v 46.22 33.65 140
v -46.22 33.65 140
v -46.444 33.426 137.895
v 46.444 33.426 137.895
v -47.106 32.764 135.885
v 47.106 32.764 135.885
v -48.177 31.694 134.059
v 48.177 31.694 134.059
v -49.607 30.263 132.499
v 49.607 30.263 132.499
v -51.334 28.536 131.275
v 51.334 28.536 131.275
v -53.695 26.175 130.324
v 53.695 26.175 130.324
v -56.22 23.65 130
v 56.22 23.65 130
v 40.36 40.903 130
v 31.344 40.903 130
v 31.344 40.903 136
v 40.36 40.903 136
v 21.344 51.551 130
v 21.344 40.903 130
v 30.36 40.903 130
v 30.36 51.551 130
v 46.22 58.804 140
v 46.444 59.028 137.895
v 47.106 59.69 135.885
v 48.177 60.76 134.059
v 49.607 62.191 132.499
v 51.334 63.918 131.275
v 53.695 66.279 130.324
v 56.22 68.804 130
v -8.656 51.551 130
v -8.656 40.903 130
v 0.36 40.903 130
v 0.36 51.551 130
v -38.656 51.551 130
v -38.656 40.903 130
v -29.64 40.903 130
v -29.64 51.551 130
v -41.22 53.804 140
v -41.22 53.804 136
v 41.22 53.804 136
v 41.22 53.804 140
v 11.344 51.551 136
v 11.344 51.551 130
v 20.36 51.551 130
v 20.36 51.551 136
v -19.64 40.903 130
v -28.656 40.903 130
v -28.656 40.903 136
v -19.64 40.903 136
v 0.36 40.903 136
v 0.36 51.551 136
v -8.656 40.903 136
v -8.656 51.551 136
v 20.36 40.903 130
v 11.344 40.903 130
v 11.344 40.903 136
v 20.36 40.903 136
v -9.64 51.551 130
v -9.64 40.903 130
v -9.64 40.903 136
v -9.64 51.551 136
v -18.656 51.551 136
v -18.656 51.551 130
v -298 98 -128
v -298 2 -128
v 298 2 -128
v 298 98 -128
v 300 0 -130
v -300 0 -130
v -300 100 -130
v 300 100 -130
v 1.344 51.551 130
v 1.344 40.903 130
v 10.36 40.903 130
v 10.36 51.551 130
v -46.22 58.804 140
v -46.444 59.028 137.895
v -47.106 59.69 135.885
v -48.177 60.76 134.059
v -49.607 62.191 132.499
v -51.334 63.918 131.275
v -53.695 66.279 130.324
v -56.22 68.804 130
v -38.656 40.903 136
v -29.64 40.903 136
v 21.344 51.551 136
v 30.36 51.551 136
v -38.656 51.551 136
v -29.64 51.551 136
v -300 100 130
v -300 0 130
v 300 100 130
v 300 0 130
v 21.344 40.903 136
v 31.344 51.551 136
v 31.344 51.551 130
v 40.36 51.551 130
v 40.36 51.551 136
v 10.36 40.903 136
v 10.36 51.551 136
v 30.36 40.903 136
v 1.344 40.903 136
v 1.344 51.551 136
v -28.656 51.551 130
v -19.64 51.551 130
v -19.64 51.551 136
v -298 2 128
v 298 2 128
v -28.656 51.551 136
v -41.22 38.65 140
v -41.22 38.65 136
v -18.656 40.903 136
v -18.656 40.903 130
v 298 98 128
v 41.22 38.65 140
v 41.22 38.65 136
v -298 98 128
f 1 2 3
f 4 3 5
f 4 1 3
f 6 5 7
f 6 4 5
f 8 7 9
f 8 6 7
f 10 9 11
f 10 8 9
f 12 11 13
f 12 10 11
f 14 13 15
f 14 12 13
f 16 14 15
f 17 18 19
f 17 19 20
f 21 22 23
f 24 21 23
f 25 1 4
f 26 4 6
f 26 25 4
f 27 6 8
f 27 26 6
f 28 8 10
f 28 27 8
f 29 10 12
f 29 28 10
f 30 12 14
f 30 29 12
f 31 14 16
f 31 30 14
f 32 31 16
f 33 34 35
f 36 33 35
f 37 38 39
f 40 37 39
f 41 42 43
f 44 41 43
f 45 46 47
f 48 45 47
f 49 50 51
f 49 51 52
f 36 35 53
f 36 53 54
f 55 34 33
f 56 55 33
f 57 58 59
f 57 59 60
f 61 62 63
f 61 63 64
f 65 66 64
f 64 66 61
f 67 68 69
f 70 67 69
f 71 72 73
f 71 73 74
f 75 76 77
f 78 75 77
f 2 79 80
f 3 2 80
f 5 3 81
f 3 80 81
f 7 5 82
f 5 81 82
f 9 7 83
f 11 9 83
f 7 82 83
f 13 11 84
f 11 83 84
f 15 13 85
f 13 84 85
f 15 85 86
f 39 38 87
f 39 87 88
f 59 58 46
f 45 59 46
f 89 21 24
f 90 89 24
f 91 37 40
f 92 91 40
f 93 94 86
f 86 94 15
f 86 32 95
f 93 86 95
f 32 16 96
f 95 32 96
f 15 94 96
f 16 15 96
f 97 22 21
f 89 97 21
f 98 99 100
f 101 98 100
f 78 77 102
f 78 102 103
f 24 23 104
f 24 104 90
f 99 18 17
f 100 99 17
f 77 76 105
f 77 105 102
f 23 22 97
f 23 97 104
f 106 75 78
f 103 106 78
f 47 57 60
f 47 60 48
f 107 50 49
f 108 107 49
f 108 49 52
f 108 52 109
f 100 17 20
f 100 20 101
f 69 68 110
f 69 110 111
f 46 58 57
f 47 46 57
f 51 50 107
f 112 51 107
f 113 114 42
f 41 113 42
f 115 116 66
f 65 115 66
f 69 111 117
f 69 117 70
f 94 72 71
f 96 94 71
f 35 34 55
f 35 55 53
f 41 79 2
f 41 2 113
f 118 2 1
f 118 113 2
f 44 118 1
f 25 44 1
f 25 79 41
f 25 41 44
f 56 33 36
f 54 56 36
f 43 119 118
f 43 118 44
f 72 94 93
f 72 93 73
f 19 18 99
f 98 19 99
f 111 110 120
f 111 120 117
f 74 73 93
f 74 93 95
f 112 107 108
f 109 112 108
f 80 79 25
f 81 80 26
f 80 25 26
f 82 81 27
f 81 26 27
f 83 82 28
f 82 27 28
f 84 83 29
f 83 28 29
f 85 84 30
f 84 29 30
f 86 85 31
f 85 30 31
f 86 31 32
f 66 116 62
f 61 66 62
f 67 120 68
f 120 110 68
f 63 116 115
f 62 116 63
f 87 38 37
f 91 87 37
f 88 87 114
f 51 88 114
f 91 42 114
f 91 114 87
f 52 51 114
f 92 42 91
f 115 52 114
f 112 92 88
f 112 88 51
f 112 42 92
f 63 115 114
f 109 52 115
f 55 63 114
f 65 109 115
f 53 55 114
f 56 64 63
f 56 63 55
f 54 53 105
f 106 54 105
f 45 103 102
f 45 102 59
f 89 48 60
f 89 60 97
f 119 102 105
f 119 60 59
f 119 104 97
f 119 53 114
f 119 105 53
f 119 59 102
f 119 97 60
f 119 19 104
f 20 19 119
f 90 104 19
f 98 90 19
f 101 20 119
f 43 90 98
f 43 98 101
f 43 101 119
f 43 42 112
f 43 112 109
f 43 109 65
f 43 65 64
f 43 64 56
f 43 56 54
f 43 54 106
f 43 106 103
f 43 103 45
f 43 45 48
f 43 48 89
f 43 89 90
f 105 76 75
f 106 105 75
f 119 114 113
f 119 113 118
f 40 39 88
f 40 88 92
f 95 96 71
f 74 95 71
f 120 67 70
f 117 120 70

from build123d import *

# Parameters (mm, degrees)
SKETCH1_W           = 600
SKETCH1_H           = 260
BOSS_EXTRUDE1_DEPTH = 100
SHELL1_T            = 2
SKETCH2_W           = 92.440689116
SKETCH2_H           = 25.153929011
SKETCH2_W_2         = 82.440689116
SKETCH2_H_2         = 15.153929011
BOSS_EXTRUDE2_DEPTH = 10
SKETCH2_3_W         = 82.440689116
SKETCH2_3_H         = 15.153929011
SKETCH2_3_W_2       = 9.01524931
SKETCH2_3_H_2       = 10.647439476
BOSS_EXTRUDE3_DEPTH = 6
FILLET1_R           = 10


with BuildPart() as part:
    # Sketch1 → Boss-Extrude1 (new body)
    with BuildSketch(Plane(origin=(0, 0, 0), x_dir=(1, 0, 0), z_dir=(0, 1, 0))):
        Rectangle(SKETCH1_W, SKETCH1_H)
    extrude(amount=BOSS_EXTRUDE1_DEPTH)

    # Shell1 (no face opened: a closed hollow body)
    add(offset(amount=-SHELL1_T, mode=Mode.PRIVATE), mode=Mode.SUBTRACT)

    # Sketch2 → Boss-Extrude2 (add)
    with BuildSketch(Plane.XY.offset(130)):
        with Locations((0, 46.226910649)):
            Rectangle(SKETCH2_W, SKETCH2_H)
        with Locations((0, 46.226910649)):
            Rectangle(SKETCH2_W_2, SKETCH2_H_2, mode=Mode.SUBTRACT)
    extrude(amount=BOSS_EXTRUDE2_DEPTH)

    # Sketch2<3> → Boss-Extrude3 (add)
    with BuildSketch(Plane.XY.offset(130)):
        with Locations((0, 46.226910649)):
            Rectangle(SKETCH2_3_W, SKETCH2_3_H)
        with Locations((35.85201026, 46.226910648)):
            Rectangle(SKETCH2_3_W_2, SKETCH2_3_H_2, mode=Mode.SUBTRACT)
        with Locations((25.85201026, 46.226910648)):
            Rectangle(SKETCH2_3_W_2, SKETCH2_3_H_2, mode=Mode.SUBTRACT)
        with Locations((15.85201026, 46.226910648)):
            Rectangle(SKETCH2_3_W_2, SKETCH2_3_H_2, mode=Mode.SUBTRACT)
        with Locations((5.85201026, 46.226910648)):
            Rectangle(SKETCH2_3_W_2, SKETCH2_3_H_2, mode=Mode.SUBTRACT)
        with Locations((-4.14798974, 46.226910648)):
            Rectangle(SKETCH2_3_W_2, SKETCH2_3_H_2, mode=Mode.SUBTRACT)
        with Locations((-14.14798974, 46.226910648)):
            Rectangle(SKETCH2_3_W_2, SKETCH2_3_H_2, mode=Mode.SUBTRACT)
        with Locations((-24.14798974, 46.226910648)):
            Rectangle(SKETCH2_3_W_2, SKETCH2_3_H_2, mode=Mode.SUBTRACT)
        with Locations((-34.14798974, 46.226910648)):
            Rectangle(SKETCH2_3_W_2, SKETCH2_3_H_2, mode=Mode.SUBTRACT)
    extrude(amount=BOSS_EXTRUDE3_DEPTH)

    # Fillet1
    fillet1_edges = [part.edges().sort_by_distance(p)[0] for p in [
        (46.220344558, 46.226910648, 130),
        (0, 58.803875154, 130),
        (-46.220344558, 46.226910648, 130),
        (0, 33.649946143, 130),
    ]]
    fillet(fillet1_edges, radius=FILLET1_R - 0.0001)  # a hair under: the kernel refuses the full size


solid = part.part
